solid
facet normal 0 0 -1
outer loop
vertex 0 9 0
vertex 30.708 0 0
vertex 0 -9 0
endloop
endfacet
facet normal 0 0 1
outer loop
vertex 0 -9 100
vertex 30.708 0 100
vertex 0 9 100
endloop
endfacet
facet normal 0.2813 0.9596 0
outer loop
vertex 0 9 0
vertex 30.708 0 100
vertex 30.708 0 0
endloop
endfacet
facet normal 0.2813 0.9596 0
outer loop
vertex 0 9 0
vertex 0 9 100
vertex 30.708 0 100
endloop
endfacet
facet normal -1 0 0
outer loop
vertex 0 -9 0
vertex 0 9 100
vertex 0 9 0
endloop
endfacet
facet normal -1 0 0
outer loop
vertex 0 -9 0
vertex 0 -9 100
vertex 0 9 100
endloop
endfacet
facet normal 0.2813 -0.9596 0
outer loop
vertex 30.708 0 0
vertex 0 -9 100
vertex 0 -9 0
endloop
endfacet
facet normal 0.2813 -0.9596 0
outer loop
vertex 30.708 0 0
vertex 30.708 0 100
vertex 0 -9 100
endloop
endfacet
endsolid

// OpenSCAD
// Cat gap wedge — holds the laundry/litter room door open a cat's width.
//
// This file is the WEDGE BODY ONLY. It hangs on the hinge side of the door so
// the door cannot close past it, leaving a permanent gap at the latch edge.
// The hook that carries it off the hinge is a separate, later job — model it
// against the numbers echoed at the bottom of this file rather than guessing.
//
// THE FORM. A triangular prism standing on end: 100 mm tall, an 18 mm back
// face, and two 32 mm facets running forward from that back face to a point.
// The back sits against the hinge-side jamb, the point aims out into the
// swing. Those three numbers are given, not derived; everything else here
// falls out of them.
//
//   depth       30.708 mm   sqrt(32^2 - 9^2)
//   apex angle  32.671 deg  2 * asin(9 / 32)
//
// The taper is what makes it work. A hinge gap is a wedge itself — it closes
// as the door swings — so a matching taper seats on two faces and jams rather
// than sitting on a point and squirting out. The 18 mm back is the stop: that
// is the gap it will hold, less whatever the door's own hinge-side clearance
// already gives away.
//
// ORIENTATION. Modelled as the user described it — profile in XY, extruded up
// Z, standing on end. DO NOT PRINT IT THIS WAY. On end it is a 100 mm tower on
// a 31 x 18 footprint with a 100 mm knife edge up one side, and every layer is
// a thin triangle. Lay it on a 32 mm facet instead: a 100 x 32 face on the
// plate, ~26 mm tall, layers running across the wedge so the taper is in the
// plane of the layers and not a stack of shrinking outlines. The slicer does
// that; nothing here needs to change.
//
// tip_r rounds all three corners of the profile without moving the flats
// (erode, then dilate). Left at 0 the point is geometrically sharp, which the
// slicer truncates to about a nozzle width anyway. Give it 1-2 mm if you want
// the tip to survive being kicked.

/* [Output] */

$fa = 4;   // organic faceting per the 0.4-nozzle rule; no global high $fn
$fs = 0.4;
eps = 0.01;

/* [Wedge] */

// Height standing on end (mm). The dimension along the door's edge.
wedge_height = 100.0;
// Length of each of the two facets, back face to point (mm).
facet_len = 32.0;
// Thickness of the back face (mm). This is the gap the door is held to.
back_thick = 18.0;
// Corner radius on the profile (mm). 0 leaves a sharp point.
tip_r = 0.0;

/* [Derived — do not edit] */

half_back = back_thick / 2;
wedge_depth = sqrt(facet_len * facet_len - half_back * half_back);
apex_angle = 2 * asin(half_back / facet_len);

module cat_gap_wedge() {
  linear_extrude(height = wedge_height, convexity = 4)
    offset(r = tip_r)
      offset(r = -tip_r)
        polygon([
          [0, -half_back],      // back face, right side
          [wedge_depth, 0],     // the point
          [0, half_back],       // back face, left side
        ]);
}

cat_gap_wedge();

echo(str("depth = ", wedge_depth, " mm"));
echo(str("apex angle = ", apex_angle, " deg"));
echo(str("facet angle off the back face = ", 90 - apex_angle / 2, " deg"));
